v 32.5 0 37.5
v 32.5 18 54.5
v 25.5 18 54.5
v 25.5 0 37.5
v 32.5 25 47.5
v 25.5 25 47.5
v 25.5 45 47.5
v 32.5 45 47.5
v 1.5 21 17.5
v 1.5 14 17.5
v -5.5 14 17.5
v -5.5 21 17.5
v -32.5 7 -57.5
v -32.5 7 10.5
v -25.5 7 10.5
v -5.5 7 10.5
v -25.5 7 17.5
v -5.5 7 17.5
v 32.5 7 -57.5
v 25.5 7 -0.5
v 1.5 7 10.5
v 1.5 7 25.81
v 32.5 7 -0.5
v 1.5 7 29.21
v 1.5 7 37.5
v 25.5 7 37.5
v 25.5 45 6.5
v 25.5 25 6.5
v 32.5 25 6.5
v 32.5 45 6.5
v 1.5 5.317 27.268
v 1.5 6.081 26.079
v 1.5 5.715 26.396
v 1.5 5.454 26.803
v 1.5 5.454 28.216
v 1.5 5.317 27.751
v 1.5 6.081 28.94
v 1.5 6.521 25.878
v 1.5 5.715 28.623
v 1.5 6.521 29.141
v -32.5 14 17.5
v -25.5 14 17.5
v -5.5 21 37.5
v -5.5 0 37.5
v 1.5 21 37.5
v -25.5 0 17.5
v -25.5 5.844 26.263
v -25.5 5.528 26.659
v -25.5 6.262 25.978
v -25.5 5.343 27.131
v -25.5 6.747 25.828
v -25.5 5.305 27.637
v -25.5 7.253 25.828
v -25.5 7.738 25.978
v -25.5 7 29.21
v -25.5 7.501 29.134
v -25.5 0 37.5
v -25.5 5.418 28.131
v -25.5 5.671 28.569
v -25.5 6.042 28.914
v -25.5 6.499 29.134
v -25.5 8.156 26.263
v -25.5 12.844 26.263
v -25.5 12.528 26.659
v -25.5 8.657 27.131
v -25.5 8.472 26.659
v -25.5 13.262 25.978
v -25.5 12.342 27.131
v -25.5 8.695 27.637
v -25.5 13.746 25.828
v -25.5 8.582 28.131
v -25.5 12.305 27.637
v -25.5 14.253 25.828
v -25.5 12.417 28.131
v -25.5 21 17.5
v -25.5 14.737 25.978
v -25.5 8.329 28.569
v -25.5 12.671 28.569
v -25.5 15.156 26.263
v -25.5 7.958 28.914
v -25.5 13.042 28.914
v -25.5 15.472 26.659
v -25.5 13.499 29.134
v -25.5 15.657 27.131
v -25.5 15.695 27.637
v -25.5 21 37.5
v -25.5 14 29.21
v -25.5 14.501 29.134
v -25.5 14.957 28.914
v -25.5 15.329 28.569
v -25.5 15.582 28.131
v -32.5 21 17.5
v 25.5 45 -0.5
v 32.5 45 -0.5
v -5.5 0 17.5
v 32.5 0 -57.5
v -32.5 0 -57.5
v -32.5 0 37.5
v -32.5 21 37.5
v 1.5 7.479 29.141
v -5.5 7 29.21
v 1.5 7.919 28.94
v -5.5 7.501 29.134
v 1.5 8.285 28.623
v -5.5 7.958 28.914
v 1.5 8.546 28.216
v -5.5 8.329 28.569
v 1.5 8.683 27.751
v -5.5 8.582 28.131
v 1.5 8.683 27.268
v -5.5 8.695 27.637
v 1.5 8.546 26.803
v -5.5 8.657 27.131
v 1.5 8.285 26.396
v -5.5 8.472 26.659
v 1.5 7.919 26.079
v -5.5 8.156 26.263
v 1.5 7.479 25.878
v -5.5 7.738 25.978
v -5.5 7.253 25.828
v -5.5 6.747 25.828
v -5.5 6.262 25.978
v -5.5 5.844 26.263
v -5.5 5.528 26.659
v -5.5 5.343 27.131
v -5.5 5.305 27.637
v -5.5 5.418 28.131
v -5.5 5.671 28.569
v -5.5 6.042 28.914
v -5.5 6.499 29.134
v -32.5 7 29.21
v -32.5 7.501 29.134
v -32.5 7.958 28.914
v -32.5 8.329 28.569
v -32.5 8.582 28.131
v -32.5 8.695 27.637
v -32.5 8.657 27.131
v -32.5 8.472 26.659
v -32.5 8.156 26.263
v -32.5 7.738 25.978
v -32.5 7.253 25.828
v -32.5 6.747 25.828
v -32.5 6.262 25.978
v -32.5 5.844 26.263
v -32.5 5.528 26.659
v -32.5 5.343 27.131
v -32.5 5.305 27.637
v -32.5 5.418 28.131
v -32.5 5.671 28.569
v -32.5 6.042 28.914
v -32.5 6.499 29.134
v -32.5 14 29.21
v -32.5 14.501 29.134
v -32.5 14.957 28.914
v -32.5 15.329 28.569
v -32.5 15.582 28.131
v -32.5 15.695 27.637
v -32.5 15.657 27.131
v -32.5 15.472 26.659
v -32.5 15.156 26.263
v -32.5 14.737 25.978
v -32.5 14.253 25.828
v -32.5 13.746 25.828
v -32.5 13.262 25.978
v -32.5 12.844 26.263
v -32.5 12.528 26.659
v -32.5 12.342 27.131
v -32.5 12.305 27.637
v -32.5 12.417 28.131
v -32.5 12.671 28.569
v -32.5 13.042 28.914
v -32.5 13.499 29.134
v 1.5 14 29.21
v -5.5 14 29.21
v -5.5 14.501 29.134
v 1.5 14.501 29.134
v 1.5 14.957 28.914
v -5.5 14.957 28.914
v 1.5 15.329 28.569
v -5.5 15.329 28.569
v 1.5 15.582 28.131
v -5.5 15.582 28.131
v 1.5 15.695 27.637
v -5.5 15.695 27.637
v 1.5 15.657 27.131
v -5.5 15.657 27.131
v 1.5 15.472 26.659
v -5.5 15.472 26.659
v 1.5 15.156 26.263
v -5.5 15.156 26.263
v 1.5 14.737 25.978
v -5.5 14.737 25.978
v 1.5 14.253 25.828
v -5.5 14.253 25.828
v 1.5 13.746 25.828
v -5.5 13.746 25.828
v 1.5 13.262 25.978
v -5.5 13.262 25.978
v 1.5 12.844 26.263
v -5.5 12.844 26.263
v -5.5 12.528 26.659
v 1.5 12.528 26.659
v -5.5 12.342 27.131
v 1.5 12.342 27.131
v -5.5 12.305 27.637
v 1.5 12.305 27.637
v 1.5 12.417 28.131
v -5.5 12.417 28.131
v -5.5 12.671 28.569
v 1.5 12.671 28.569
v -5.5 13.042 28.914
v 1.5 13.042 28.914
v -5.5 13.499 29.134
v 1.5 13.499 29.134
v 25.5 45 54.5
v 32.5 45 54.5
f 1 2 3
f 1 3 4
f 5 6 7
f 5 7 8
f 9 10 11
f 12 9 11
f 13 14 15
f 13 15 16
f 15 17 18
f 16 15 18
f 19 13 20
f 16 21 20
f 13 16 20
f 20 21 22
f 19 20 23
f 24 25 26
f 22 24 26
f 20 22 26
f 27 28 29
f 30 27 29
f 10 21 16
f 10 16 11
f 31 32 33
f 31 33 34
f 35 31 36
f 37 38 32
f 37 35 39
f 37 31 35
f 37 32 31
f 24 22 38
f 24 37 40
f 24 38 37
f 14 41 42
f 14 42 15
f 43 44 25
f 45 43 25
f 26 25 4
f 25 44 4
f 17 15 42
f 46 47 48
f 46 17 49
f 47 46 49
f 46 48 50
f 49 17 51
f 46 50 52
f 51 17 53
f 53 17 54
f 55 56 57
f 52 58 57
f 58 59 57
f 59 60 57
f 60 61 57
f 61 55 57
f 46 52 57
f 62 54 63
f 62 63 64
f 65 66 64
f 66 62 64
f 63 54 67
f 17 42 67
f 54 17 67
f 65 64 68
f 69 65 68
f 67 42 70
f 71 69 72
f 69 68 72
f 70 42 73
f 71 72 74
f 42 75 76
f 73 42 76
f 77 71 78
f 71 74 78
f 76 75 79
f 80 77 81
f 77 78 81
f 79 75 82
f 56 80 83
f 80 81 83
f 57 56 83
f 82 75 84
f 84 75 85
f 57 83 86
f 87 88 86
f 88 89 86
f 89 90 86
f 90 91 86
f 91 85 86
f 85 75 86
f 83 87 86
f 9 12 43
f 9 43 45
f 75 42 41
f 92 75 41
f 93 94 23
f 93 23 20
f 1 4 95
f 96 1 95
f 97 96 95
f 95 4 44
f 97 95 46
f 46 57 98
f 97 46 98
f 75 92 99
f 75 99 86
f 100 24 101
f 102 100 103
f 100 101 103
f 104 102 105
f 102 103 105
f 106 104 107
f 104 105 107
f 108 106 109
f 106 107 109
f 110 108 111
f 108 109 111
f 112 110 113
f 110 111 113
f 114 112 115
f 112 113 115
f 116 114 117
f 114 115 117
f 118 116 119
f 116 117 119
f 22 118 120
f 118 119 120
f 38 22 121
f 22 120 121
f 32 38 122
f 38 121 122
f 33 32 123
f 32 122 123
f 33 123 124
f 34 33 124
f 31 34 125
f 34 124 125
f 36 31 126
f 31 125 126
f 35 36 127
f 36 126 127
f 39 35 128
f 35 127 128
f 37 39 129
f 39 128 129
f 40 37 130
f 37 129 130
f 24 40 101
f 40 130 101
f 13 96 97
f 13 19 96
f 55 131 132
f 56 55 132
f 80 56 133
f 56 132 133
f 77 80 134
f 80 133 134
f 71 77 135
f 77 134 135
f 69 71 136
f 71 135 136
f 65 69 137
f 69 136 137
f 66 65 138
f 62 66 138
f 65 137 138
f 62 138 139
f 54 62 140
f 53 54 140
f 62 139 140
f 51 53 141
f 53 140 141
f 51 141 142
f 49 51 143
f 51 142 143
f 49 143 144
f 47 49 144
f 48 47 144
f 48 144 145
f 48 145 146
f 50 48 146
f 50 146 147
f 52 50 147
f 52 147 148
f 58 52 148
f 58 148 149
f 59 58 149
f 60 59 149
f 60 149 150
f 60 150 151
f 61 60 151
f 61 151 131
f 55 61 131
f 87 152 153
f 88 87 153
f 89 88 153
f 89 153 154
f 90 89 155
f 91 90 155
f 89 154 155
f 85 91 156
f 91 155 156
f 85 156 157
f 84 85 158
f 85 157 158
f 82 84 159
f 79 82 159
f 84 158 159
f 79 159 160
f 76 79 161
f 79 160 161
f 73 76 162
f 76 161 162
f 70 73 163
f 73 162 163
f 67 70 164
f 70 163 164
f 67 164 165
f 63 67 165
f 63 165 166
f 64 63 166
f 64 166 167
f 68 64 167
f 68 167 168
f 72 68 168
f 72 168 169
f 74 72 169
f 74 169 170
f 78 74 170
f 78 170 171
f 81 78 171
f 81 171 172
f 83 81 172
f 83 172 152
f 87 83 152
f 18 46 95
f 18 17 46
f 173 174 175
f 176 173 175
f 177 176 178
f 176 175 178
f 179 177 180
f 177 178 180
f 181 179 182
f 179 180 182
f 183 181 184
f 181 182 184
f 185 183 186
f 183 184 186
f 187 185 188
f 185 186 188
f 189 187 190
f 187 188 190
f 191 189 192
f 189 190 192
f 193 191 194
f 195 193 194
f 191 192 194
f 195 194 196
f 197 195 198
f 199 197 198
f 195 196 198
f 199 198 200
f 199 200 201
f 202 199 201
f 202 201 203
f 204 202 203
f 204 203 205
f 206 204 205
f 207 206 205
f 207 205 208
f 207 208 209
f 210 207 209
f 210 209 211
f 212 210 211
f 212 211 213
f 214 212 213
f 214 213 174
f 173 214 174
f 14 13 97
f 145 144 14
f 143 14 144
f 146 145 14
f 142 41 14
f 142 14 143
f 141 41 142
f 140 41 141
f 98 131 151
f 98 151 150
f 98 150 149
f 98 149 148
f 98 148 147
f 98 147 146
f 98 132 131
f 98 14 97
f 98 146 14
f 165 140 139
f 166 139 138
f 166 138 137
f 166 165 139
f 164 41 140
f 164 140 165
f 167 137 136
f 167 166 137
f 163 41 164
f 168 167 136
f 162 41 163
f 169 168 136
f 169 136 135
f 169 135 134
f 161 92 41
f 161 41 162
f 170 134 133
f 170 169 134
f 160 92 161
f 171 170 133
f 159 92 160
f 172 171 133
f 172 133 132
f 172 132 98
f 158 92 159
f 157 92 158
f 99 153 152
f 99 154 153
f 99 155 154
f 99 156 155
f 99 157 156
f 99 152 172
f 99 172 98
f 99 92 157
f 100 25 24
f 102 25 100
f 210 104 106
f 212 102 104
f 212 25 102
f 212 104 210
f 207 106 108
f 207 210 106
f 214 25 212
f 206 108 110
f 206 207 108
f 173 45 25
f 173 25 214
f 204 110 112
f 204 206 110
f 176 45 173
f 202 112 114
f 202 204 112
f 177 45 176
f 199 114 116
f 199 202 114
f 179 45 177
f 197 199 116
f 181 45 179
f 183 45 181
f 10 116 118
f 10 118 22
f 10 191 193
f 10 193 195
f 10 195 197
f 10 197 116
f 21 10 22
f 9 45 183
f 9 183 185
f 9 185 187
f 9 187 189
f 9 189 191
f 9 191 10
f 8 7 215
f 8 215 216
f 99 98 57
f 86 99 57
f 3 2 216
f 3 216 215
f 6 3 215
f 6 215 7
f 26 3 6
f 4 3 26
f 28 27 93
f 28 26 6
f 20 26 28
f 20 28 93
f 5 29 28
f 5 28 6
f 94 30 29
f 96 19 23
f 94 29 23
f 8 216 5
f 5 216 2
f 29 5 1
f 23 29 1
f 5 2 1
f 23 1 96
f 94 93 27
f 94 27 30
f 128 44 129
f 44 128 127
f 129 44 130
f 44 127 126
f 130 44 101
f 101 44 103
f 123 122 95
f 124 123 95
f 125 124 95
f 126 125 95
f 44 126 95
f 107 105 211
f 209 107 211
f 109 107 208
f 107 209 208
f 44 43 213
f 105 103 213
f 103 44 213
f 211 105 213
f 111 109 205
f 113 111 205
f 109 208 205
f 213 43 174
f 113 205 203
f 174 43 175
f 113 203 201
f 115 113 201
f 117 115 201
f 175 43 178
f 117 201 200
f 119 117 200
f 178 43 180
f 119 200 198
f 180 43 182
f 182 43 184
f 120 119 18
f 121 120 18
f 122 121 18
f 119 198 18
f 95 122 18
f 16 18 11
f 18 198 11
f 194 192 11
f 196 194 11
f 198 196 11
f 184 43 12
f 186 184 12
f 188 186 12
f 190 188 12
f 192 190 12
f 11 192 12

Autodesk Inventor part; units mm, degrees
ref_plane "YZ Plane" through (0, 0, 0) normal (1, 0, 0) x (0, 1, 0)
ref_plane "XZ Plane" through (0, 0, 0) normal (0, 1, 0) x (-1, 0, 0)
ref_plane "XY Plane" through (0, 0, 0) normal (0, 0, 1) x (1, 0, 0)
sketch "Sketch1" plane through (0, 0, 0) normal (0, 1, 0) x (-1, 0, 0)
  line L0 (32.5, 37.5) -> (-32.5, 37.5)
  line L1 (-32.5, 37.5) -> (-32.5, -37.5)
  line L2 (-32.5, -37.5) -> (32.5, -37.5)
  line L3 (32.5, -37.5) -> (32.5, 37.5)
  line L4 (32.5, 37.5) -> (-32.5, -37.5) construction
  line L5 (-32.5, 37.5) -> (32.5, -37.5) construction
  point P0 (0, 0)
  dimension "d0" = 65
  dimension "d1" = 75
extrude "Extrusion1" add sketch "Sketch1" along normal blind 7
sketch "Sketch6" plane through (0, 7, 0) normal (0, 1, 0) x (1, 0, 0)
  line L0 (-32.5, 37.5) -> (-32.5, -37.5) projected
  line L1 (-32.5, -37.5) -> (-25.5, -37.5)
  line L2 (-32.5, -37.5) -> (32.5, -37.5) projected
  line L3 (-25.5, -37.5) -> (-25.5, -17.5)
  line L4 (-25.5, -17.5) -> (-5.5, -17.5)
  line L5 (-5.5, -17.5) -> (-5.5, -37.5)
  line L6 (-25.5, -17.5) -> (-32.5, -17.5)
  point P0 (0, 0)
  dimension "d13" = 7
  dimension "d14" = 20
  dimension "d15" = 20
  dimension "d16" = 20
  dimension "d17" = 90
extrude "Extrusion4" cut sketch "Sketch6" against normal blind 14 contours L4 L5 L2 L3
sketch "Sketch7" plane through (0, 7, 0) normal (0, 1, 0) x (1, 0, 0)
  line L0 (-25.5, -37.5) -> (-25.5, -17.5) projected
  line L1 (-32.5, -37.5) -> (-25.5, -37.5)
  line L2 (-25.5, -37.5) -> (-25.5, -17.5)
  line L3 (-25.5, -17.5) -> (-32.5, -17.5)
  line L4 (-32.5, -17.5) -> (-32.5, -37.5)
  point P0 (0, 0)
extrude "Extrusion5" add sketch "Sketch7" along normal blind 14
sketch "Sketch8" plane through (0, 7, 0) normal (0, 1, 0) x (1, 0, 0)
  line L0 (-5.5, -37.5) -> (32.5, -37.5) projected
  line L1 (32.5, -37.5) -> (25.5, -37.5)
  line L2 (25.5, -37.5) -> (25.5, 0.5)
  line L3 (25.5, 0.5) -> (32.5, 0.5)
  line L4 (32.5, 0.5) -> (32.5, -37.5)
  point P0 (0, 0)
  dimension "d22" = 7
  dimension "d23" = 38
extrude "Extrusion6" add sketch "Sketch8" along normal blind 18
sketch "Sketch9" plane through (0, 25, 0) normal (0, 1, 0) x (1, 0, 0)
  line L0 (32.5, 0.5) -> (25.5, 0.5) projected
  line L1 (25.5, 0.5) -> (25.5, -37.5) projected
  line L2 (32.5, 0.5) -> (25.5, 0.5)
  line L3 (25.5, 0.5) -> (25.5, -6.5)
  line L4 (25.5, -6.5) -> (32.5, -6.5)
  line L5 (32.5, -6.5) -> (32.5, 0.5)
  point P0 (0, 0)
  dimension "d26" = 7
extrude "Extrusion7" add sketch "Sketch9" along normal blind 20
sketch "Sketch10" plane through (0, 25, 0) normal (0, 1, 0) x (1, 0, 0)
  line L0 (32.5, -6.5) -> (32.5, 0.5) projected
  line L1 (32.5, 0.5) -> (32.5, -54.5)
  line L2 (32.5, -54.5) -> (25.5, -54.5)
  line L3 (25.5, -54.5) -> (25.5, -47.5)
  line L4 (25.5, -47.5) -> (32.5, -47.5)
  line L5 (32.5, -47.5) -> (32.5, -54.5)
  point P0 (0, 0)
  dimension "d29" = 55
  dimension "d30" = 7
  dimension "d31" = 7
extrude "Extrusion8" add sketch "Sketch10" along normal blind 20
sketch "Sketch11" plane through (32.5, 0, 37.5) normal (1, 0, 0) x (0, 0, -1)
  line L0 (-17, 25) -> (-10, 25) projected
  line L1 (0, 7) -> (0, 25) construction
  line L2 (0, 7) -> (0, 25)
  line L3 (0, 25) -> (-17, 25)
  line L4 (-17, 25) -> (-17, 45) projected
  line L5 (0, 7) -> (0, 0)
  line L6 (-17, 25) -> (-17, 18)
  line L7 (-17, 18) -> (0, 0)
  point P0 (37.5, 0)
  dimension "d37" = 7
extrude "Extrusion9" add sketch "Sketch11" against normal up to surface (7 mm away)
sketch "Sketch13" plane through (32.5, 0, -37.5) normal (0, 0, -1) x (-1, 0, 0)
  line L0 (65, 7) -> (58, 7) projected
  line L1 (0, 0) -> (65, 0)
  line L2 (65, 0) -> (65, 7)
  line L3 (65, 7) -> (0, 7)
  line L4 (0, 7) -> (0, 0)
  point P0 (32.5, 0)
extrude "Extrusion10" add sketch "Sketch13" along normal blind 20
sketch "Sketch14" plane through (0, 7, 0) normal (0, 1, 0) x (1, 0, 0)
  point P0 (0, 0)
sketch "Sketch15" plane through (-25.5, 0, 37.5) normal (1, 0, 0) x (0, 0, -1)
  point P0 (37.5, 0)
sketch "Sketch16" plane through (-32.5, 0, 37.5) normal (-1, 0, 0) x (0, 0, 1)
  point P0 (-37.5, 0)
ref_plane "Work Plane1" through (-15.5, 0, 37.5) normal (1, 0, 0) x (0, 0, -1)
mirror "Mirror1" about plane through (-15.5, 0, 37.5) normal (1, 0, 0) of "Extrusion5"
sketch "Sketch18" plane through (-32.5, 0, 37.5) normal (-1, 0, 0) x (0, 0, 1)
  line L0 (-20, 7) -> (-20, 0) projected
  line L1 (-20, 7) -> (-20, 14)
  line L2 (-20, 7) -> (-20, 21) projected
  line L3 (-20, 7) -> (-13, 7) construction
  line L4 (-20, 14) -> (-27, 7)
  line L5 (-20, 7) -> (-95, 7) projected
  point P0 (-37.5, 0)
  dimension "d43" = 7
  dimension "d44" = 90
  dimension "d45" = 45
extrude "Extrusion12" add sketch "Sketch18" against normal up to surface (7 mm away)
mirror "Mirror2" about plane through (-15.5, 0, 37.5) normal (1, 0, 0) of "Extrusion12"
sketch "Sketch19" plane through (-32.5, 0, 37.5) normal (-1, 0, 0) x (0, 0, 1)
  line L0 (0, 0) -> (0, 21) projected
  line L1 (-20, 14) -> (-20, 21) projected
  circle A0 centre (-10, 14) radius 1.7 construction
  circle A1 centre (-10, 7) radius 1.7 construction
  point P0 (-37.5, 0)
  dimension "d52" = 3.4
  dimension "d53" = 3.4
sketch "Sketch20" plane through (-32.5, 0, 37.5) normal (-1, 0, 0) x (0, 0, 1)
  line L0 (0, 7) -> (-38, 7) projected
  circle A0 centre (-9.9905, 7) radius 1.7
  circle A1 centre (-9.9905, 13.9998) radius 1.7
  point P0 (-37.5, 0)
  dimension "d54" = 3.4
  dimension "d55" = 3.4
extrude "Extrusion13" cut sketch "Sketch20" against normal up to surface (34 mm away)
properties part number "graber thingie"
